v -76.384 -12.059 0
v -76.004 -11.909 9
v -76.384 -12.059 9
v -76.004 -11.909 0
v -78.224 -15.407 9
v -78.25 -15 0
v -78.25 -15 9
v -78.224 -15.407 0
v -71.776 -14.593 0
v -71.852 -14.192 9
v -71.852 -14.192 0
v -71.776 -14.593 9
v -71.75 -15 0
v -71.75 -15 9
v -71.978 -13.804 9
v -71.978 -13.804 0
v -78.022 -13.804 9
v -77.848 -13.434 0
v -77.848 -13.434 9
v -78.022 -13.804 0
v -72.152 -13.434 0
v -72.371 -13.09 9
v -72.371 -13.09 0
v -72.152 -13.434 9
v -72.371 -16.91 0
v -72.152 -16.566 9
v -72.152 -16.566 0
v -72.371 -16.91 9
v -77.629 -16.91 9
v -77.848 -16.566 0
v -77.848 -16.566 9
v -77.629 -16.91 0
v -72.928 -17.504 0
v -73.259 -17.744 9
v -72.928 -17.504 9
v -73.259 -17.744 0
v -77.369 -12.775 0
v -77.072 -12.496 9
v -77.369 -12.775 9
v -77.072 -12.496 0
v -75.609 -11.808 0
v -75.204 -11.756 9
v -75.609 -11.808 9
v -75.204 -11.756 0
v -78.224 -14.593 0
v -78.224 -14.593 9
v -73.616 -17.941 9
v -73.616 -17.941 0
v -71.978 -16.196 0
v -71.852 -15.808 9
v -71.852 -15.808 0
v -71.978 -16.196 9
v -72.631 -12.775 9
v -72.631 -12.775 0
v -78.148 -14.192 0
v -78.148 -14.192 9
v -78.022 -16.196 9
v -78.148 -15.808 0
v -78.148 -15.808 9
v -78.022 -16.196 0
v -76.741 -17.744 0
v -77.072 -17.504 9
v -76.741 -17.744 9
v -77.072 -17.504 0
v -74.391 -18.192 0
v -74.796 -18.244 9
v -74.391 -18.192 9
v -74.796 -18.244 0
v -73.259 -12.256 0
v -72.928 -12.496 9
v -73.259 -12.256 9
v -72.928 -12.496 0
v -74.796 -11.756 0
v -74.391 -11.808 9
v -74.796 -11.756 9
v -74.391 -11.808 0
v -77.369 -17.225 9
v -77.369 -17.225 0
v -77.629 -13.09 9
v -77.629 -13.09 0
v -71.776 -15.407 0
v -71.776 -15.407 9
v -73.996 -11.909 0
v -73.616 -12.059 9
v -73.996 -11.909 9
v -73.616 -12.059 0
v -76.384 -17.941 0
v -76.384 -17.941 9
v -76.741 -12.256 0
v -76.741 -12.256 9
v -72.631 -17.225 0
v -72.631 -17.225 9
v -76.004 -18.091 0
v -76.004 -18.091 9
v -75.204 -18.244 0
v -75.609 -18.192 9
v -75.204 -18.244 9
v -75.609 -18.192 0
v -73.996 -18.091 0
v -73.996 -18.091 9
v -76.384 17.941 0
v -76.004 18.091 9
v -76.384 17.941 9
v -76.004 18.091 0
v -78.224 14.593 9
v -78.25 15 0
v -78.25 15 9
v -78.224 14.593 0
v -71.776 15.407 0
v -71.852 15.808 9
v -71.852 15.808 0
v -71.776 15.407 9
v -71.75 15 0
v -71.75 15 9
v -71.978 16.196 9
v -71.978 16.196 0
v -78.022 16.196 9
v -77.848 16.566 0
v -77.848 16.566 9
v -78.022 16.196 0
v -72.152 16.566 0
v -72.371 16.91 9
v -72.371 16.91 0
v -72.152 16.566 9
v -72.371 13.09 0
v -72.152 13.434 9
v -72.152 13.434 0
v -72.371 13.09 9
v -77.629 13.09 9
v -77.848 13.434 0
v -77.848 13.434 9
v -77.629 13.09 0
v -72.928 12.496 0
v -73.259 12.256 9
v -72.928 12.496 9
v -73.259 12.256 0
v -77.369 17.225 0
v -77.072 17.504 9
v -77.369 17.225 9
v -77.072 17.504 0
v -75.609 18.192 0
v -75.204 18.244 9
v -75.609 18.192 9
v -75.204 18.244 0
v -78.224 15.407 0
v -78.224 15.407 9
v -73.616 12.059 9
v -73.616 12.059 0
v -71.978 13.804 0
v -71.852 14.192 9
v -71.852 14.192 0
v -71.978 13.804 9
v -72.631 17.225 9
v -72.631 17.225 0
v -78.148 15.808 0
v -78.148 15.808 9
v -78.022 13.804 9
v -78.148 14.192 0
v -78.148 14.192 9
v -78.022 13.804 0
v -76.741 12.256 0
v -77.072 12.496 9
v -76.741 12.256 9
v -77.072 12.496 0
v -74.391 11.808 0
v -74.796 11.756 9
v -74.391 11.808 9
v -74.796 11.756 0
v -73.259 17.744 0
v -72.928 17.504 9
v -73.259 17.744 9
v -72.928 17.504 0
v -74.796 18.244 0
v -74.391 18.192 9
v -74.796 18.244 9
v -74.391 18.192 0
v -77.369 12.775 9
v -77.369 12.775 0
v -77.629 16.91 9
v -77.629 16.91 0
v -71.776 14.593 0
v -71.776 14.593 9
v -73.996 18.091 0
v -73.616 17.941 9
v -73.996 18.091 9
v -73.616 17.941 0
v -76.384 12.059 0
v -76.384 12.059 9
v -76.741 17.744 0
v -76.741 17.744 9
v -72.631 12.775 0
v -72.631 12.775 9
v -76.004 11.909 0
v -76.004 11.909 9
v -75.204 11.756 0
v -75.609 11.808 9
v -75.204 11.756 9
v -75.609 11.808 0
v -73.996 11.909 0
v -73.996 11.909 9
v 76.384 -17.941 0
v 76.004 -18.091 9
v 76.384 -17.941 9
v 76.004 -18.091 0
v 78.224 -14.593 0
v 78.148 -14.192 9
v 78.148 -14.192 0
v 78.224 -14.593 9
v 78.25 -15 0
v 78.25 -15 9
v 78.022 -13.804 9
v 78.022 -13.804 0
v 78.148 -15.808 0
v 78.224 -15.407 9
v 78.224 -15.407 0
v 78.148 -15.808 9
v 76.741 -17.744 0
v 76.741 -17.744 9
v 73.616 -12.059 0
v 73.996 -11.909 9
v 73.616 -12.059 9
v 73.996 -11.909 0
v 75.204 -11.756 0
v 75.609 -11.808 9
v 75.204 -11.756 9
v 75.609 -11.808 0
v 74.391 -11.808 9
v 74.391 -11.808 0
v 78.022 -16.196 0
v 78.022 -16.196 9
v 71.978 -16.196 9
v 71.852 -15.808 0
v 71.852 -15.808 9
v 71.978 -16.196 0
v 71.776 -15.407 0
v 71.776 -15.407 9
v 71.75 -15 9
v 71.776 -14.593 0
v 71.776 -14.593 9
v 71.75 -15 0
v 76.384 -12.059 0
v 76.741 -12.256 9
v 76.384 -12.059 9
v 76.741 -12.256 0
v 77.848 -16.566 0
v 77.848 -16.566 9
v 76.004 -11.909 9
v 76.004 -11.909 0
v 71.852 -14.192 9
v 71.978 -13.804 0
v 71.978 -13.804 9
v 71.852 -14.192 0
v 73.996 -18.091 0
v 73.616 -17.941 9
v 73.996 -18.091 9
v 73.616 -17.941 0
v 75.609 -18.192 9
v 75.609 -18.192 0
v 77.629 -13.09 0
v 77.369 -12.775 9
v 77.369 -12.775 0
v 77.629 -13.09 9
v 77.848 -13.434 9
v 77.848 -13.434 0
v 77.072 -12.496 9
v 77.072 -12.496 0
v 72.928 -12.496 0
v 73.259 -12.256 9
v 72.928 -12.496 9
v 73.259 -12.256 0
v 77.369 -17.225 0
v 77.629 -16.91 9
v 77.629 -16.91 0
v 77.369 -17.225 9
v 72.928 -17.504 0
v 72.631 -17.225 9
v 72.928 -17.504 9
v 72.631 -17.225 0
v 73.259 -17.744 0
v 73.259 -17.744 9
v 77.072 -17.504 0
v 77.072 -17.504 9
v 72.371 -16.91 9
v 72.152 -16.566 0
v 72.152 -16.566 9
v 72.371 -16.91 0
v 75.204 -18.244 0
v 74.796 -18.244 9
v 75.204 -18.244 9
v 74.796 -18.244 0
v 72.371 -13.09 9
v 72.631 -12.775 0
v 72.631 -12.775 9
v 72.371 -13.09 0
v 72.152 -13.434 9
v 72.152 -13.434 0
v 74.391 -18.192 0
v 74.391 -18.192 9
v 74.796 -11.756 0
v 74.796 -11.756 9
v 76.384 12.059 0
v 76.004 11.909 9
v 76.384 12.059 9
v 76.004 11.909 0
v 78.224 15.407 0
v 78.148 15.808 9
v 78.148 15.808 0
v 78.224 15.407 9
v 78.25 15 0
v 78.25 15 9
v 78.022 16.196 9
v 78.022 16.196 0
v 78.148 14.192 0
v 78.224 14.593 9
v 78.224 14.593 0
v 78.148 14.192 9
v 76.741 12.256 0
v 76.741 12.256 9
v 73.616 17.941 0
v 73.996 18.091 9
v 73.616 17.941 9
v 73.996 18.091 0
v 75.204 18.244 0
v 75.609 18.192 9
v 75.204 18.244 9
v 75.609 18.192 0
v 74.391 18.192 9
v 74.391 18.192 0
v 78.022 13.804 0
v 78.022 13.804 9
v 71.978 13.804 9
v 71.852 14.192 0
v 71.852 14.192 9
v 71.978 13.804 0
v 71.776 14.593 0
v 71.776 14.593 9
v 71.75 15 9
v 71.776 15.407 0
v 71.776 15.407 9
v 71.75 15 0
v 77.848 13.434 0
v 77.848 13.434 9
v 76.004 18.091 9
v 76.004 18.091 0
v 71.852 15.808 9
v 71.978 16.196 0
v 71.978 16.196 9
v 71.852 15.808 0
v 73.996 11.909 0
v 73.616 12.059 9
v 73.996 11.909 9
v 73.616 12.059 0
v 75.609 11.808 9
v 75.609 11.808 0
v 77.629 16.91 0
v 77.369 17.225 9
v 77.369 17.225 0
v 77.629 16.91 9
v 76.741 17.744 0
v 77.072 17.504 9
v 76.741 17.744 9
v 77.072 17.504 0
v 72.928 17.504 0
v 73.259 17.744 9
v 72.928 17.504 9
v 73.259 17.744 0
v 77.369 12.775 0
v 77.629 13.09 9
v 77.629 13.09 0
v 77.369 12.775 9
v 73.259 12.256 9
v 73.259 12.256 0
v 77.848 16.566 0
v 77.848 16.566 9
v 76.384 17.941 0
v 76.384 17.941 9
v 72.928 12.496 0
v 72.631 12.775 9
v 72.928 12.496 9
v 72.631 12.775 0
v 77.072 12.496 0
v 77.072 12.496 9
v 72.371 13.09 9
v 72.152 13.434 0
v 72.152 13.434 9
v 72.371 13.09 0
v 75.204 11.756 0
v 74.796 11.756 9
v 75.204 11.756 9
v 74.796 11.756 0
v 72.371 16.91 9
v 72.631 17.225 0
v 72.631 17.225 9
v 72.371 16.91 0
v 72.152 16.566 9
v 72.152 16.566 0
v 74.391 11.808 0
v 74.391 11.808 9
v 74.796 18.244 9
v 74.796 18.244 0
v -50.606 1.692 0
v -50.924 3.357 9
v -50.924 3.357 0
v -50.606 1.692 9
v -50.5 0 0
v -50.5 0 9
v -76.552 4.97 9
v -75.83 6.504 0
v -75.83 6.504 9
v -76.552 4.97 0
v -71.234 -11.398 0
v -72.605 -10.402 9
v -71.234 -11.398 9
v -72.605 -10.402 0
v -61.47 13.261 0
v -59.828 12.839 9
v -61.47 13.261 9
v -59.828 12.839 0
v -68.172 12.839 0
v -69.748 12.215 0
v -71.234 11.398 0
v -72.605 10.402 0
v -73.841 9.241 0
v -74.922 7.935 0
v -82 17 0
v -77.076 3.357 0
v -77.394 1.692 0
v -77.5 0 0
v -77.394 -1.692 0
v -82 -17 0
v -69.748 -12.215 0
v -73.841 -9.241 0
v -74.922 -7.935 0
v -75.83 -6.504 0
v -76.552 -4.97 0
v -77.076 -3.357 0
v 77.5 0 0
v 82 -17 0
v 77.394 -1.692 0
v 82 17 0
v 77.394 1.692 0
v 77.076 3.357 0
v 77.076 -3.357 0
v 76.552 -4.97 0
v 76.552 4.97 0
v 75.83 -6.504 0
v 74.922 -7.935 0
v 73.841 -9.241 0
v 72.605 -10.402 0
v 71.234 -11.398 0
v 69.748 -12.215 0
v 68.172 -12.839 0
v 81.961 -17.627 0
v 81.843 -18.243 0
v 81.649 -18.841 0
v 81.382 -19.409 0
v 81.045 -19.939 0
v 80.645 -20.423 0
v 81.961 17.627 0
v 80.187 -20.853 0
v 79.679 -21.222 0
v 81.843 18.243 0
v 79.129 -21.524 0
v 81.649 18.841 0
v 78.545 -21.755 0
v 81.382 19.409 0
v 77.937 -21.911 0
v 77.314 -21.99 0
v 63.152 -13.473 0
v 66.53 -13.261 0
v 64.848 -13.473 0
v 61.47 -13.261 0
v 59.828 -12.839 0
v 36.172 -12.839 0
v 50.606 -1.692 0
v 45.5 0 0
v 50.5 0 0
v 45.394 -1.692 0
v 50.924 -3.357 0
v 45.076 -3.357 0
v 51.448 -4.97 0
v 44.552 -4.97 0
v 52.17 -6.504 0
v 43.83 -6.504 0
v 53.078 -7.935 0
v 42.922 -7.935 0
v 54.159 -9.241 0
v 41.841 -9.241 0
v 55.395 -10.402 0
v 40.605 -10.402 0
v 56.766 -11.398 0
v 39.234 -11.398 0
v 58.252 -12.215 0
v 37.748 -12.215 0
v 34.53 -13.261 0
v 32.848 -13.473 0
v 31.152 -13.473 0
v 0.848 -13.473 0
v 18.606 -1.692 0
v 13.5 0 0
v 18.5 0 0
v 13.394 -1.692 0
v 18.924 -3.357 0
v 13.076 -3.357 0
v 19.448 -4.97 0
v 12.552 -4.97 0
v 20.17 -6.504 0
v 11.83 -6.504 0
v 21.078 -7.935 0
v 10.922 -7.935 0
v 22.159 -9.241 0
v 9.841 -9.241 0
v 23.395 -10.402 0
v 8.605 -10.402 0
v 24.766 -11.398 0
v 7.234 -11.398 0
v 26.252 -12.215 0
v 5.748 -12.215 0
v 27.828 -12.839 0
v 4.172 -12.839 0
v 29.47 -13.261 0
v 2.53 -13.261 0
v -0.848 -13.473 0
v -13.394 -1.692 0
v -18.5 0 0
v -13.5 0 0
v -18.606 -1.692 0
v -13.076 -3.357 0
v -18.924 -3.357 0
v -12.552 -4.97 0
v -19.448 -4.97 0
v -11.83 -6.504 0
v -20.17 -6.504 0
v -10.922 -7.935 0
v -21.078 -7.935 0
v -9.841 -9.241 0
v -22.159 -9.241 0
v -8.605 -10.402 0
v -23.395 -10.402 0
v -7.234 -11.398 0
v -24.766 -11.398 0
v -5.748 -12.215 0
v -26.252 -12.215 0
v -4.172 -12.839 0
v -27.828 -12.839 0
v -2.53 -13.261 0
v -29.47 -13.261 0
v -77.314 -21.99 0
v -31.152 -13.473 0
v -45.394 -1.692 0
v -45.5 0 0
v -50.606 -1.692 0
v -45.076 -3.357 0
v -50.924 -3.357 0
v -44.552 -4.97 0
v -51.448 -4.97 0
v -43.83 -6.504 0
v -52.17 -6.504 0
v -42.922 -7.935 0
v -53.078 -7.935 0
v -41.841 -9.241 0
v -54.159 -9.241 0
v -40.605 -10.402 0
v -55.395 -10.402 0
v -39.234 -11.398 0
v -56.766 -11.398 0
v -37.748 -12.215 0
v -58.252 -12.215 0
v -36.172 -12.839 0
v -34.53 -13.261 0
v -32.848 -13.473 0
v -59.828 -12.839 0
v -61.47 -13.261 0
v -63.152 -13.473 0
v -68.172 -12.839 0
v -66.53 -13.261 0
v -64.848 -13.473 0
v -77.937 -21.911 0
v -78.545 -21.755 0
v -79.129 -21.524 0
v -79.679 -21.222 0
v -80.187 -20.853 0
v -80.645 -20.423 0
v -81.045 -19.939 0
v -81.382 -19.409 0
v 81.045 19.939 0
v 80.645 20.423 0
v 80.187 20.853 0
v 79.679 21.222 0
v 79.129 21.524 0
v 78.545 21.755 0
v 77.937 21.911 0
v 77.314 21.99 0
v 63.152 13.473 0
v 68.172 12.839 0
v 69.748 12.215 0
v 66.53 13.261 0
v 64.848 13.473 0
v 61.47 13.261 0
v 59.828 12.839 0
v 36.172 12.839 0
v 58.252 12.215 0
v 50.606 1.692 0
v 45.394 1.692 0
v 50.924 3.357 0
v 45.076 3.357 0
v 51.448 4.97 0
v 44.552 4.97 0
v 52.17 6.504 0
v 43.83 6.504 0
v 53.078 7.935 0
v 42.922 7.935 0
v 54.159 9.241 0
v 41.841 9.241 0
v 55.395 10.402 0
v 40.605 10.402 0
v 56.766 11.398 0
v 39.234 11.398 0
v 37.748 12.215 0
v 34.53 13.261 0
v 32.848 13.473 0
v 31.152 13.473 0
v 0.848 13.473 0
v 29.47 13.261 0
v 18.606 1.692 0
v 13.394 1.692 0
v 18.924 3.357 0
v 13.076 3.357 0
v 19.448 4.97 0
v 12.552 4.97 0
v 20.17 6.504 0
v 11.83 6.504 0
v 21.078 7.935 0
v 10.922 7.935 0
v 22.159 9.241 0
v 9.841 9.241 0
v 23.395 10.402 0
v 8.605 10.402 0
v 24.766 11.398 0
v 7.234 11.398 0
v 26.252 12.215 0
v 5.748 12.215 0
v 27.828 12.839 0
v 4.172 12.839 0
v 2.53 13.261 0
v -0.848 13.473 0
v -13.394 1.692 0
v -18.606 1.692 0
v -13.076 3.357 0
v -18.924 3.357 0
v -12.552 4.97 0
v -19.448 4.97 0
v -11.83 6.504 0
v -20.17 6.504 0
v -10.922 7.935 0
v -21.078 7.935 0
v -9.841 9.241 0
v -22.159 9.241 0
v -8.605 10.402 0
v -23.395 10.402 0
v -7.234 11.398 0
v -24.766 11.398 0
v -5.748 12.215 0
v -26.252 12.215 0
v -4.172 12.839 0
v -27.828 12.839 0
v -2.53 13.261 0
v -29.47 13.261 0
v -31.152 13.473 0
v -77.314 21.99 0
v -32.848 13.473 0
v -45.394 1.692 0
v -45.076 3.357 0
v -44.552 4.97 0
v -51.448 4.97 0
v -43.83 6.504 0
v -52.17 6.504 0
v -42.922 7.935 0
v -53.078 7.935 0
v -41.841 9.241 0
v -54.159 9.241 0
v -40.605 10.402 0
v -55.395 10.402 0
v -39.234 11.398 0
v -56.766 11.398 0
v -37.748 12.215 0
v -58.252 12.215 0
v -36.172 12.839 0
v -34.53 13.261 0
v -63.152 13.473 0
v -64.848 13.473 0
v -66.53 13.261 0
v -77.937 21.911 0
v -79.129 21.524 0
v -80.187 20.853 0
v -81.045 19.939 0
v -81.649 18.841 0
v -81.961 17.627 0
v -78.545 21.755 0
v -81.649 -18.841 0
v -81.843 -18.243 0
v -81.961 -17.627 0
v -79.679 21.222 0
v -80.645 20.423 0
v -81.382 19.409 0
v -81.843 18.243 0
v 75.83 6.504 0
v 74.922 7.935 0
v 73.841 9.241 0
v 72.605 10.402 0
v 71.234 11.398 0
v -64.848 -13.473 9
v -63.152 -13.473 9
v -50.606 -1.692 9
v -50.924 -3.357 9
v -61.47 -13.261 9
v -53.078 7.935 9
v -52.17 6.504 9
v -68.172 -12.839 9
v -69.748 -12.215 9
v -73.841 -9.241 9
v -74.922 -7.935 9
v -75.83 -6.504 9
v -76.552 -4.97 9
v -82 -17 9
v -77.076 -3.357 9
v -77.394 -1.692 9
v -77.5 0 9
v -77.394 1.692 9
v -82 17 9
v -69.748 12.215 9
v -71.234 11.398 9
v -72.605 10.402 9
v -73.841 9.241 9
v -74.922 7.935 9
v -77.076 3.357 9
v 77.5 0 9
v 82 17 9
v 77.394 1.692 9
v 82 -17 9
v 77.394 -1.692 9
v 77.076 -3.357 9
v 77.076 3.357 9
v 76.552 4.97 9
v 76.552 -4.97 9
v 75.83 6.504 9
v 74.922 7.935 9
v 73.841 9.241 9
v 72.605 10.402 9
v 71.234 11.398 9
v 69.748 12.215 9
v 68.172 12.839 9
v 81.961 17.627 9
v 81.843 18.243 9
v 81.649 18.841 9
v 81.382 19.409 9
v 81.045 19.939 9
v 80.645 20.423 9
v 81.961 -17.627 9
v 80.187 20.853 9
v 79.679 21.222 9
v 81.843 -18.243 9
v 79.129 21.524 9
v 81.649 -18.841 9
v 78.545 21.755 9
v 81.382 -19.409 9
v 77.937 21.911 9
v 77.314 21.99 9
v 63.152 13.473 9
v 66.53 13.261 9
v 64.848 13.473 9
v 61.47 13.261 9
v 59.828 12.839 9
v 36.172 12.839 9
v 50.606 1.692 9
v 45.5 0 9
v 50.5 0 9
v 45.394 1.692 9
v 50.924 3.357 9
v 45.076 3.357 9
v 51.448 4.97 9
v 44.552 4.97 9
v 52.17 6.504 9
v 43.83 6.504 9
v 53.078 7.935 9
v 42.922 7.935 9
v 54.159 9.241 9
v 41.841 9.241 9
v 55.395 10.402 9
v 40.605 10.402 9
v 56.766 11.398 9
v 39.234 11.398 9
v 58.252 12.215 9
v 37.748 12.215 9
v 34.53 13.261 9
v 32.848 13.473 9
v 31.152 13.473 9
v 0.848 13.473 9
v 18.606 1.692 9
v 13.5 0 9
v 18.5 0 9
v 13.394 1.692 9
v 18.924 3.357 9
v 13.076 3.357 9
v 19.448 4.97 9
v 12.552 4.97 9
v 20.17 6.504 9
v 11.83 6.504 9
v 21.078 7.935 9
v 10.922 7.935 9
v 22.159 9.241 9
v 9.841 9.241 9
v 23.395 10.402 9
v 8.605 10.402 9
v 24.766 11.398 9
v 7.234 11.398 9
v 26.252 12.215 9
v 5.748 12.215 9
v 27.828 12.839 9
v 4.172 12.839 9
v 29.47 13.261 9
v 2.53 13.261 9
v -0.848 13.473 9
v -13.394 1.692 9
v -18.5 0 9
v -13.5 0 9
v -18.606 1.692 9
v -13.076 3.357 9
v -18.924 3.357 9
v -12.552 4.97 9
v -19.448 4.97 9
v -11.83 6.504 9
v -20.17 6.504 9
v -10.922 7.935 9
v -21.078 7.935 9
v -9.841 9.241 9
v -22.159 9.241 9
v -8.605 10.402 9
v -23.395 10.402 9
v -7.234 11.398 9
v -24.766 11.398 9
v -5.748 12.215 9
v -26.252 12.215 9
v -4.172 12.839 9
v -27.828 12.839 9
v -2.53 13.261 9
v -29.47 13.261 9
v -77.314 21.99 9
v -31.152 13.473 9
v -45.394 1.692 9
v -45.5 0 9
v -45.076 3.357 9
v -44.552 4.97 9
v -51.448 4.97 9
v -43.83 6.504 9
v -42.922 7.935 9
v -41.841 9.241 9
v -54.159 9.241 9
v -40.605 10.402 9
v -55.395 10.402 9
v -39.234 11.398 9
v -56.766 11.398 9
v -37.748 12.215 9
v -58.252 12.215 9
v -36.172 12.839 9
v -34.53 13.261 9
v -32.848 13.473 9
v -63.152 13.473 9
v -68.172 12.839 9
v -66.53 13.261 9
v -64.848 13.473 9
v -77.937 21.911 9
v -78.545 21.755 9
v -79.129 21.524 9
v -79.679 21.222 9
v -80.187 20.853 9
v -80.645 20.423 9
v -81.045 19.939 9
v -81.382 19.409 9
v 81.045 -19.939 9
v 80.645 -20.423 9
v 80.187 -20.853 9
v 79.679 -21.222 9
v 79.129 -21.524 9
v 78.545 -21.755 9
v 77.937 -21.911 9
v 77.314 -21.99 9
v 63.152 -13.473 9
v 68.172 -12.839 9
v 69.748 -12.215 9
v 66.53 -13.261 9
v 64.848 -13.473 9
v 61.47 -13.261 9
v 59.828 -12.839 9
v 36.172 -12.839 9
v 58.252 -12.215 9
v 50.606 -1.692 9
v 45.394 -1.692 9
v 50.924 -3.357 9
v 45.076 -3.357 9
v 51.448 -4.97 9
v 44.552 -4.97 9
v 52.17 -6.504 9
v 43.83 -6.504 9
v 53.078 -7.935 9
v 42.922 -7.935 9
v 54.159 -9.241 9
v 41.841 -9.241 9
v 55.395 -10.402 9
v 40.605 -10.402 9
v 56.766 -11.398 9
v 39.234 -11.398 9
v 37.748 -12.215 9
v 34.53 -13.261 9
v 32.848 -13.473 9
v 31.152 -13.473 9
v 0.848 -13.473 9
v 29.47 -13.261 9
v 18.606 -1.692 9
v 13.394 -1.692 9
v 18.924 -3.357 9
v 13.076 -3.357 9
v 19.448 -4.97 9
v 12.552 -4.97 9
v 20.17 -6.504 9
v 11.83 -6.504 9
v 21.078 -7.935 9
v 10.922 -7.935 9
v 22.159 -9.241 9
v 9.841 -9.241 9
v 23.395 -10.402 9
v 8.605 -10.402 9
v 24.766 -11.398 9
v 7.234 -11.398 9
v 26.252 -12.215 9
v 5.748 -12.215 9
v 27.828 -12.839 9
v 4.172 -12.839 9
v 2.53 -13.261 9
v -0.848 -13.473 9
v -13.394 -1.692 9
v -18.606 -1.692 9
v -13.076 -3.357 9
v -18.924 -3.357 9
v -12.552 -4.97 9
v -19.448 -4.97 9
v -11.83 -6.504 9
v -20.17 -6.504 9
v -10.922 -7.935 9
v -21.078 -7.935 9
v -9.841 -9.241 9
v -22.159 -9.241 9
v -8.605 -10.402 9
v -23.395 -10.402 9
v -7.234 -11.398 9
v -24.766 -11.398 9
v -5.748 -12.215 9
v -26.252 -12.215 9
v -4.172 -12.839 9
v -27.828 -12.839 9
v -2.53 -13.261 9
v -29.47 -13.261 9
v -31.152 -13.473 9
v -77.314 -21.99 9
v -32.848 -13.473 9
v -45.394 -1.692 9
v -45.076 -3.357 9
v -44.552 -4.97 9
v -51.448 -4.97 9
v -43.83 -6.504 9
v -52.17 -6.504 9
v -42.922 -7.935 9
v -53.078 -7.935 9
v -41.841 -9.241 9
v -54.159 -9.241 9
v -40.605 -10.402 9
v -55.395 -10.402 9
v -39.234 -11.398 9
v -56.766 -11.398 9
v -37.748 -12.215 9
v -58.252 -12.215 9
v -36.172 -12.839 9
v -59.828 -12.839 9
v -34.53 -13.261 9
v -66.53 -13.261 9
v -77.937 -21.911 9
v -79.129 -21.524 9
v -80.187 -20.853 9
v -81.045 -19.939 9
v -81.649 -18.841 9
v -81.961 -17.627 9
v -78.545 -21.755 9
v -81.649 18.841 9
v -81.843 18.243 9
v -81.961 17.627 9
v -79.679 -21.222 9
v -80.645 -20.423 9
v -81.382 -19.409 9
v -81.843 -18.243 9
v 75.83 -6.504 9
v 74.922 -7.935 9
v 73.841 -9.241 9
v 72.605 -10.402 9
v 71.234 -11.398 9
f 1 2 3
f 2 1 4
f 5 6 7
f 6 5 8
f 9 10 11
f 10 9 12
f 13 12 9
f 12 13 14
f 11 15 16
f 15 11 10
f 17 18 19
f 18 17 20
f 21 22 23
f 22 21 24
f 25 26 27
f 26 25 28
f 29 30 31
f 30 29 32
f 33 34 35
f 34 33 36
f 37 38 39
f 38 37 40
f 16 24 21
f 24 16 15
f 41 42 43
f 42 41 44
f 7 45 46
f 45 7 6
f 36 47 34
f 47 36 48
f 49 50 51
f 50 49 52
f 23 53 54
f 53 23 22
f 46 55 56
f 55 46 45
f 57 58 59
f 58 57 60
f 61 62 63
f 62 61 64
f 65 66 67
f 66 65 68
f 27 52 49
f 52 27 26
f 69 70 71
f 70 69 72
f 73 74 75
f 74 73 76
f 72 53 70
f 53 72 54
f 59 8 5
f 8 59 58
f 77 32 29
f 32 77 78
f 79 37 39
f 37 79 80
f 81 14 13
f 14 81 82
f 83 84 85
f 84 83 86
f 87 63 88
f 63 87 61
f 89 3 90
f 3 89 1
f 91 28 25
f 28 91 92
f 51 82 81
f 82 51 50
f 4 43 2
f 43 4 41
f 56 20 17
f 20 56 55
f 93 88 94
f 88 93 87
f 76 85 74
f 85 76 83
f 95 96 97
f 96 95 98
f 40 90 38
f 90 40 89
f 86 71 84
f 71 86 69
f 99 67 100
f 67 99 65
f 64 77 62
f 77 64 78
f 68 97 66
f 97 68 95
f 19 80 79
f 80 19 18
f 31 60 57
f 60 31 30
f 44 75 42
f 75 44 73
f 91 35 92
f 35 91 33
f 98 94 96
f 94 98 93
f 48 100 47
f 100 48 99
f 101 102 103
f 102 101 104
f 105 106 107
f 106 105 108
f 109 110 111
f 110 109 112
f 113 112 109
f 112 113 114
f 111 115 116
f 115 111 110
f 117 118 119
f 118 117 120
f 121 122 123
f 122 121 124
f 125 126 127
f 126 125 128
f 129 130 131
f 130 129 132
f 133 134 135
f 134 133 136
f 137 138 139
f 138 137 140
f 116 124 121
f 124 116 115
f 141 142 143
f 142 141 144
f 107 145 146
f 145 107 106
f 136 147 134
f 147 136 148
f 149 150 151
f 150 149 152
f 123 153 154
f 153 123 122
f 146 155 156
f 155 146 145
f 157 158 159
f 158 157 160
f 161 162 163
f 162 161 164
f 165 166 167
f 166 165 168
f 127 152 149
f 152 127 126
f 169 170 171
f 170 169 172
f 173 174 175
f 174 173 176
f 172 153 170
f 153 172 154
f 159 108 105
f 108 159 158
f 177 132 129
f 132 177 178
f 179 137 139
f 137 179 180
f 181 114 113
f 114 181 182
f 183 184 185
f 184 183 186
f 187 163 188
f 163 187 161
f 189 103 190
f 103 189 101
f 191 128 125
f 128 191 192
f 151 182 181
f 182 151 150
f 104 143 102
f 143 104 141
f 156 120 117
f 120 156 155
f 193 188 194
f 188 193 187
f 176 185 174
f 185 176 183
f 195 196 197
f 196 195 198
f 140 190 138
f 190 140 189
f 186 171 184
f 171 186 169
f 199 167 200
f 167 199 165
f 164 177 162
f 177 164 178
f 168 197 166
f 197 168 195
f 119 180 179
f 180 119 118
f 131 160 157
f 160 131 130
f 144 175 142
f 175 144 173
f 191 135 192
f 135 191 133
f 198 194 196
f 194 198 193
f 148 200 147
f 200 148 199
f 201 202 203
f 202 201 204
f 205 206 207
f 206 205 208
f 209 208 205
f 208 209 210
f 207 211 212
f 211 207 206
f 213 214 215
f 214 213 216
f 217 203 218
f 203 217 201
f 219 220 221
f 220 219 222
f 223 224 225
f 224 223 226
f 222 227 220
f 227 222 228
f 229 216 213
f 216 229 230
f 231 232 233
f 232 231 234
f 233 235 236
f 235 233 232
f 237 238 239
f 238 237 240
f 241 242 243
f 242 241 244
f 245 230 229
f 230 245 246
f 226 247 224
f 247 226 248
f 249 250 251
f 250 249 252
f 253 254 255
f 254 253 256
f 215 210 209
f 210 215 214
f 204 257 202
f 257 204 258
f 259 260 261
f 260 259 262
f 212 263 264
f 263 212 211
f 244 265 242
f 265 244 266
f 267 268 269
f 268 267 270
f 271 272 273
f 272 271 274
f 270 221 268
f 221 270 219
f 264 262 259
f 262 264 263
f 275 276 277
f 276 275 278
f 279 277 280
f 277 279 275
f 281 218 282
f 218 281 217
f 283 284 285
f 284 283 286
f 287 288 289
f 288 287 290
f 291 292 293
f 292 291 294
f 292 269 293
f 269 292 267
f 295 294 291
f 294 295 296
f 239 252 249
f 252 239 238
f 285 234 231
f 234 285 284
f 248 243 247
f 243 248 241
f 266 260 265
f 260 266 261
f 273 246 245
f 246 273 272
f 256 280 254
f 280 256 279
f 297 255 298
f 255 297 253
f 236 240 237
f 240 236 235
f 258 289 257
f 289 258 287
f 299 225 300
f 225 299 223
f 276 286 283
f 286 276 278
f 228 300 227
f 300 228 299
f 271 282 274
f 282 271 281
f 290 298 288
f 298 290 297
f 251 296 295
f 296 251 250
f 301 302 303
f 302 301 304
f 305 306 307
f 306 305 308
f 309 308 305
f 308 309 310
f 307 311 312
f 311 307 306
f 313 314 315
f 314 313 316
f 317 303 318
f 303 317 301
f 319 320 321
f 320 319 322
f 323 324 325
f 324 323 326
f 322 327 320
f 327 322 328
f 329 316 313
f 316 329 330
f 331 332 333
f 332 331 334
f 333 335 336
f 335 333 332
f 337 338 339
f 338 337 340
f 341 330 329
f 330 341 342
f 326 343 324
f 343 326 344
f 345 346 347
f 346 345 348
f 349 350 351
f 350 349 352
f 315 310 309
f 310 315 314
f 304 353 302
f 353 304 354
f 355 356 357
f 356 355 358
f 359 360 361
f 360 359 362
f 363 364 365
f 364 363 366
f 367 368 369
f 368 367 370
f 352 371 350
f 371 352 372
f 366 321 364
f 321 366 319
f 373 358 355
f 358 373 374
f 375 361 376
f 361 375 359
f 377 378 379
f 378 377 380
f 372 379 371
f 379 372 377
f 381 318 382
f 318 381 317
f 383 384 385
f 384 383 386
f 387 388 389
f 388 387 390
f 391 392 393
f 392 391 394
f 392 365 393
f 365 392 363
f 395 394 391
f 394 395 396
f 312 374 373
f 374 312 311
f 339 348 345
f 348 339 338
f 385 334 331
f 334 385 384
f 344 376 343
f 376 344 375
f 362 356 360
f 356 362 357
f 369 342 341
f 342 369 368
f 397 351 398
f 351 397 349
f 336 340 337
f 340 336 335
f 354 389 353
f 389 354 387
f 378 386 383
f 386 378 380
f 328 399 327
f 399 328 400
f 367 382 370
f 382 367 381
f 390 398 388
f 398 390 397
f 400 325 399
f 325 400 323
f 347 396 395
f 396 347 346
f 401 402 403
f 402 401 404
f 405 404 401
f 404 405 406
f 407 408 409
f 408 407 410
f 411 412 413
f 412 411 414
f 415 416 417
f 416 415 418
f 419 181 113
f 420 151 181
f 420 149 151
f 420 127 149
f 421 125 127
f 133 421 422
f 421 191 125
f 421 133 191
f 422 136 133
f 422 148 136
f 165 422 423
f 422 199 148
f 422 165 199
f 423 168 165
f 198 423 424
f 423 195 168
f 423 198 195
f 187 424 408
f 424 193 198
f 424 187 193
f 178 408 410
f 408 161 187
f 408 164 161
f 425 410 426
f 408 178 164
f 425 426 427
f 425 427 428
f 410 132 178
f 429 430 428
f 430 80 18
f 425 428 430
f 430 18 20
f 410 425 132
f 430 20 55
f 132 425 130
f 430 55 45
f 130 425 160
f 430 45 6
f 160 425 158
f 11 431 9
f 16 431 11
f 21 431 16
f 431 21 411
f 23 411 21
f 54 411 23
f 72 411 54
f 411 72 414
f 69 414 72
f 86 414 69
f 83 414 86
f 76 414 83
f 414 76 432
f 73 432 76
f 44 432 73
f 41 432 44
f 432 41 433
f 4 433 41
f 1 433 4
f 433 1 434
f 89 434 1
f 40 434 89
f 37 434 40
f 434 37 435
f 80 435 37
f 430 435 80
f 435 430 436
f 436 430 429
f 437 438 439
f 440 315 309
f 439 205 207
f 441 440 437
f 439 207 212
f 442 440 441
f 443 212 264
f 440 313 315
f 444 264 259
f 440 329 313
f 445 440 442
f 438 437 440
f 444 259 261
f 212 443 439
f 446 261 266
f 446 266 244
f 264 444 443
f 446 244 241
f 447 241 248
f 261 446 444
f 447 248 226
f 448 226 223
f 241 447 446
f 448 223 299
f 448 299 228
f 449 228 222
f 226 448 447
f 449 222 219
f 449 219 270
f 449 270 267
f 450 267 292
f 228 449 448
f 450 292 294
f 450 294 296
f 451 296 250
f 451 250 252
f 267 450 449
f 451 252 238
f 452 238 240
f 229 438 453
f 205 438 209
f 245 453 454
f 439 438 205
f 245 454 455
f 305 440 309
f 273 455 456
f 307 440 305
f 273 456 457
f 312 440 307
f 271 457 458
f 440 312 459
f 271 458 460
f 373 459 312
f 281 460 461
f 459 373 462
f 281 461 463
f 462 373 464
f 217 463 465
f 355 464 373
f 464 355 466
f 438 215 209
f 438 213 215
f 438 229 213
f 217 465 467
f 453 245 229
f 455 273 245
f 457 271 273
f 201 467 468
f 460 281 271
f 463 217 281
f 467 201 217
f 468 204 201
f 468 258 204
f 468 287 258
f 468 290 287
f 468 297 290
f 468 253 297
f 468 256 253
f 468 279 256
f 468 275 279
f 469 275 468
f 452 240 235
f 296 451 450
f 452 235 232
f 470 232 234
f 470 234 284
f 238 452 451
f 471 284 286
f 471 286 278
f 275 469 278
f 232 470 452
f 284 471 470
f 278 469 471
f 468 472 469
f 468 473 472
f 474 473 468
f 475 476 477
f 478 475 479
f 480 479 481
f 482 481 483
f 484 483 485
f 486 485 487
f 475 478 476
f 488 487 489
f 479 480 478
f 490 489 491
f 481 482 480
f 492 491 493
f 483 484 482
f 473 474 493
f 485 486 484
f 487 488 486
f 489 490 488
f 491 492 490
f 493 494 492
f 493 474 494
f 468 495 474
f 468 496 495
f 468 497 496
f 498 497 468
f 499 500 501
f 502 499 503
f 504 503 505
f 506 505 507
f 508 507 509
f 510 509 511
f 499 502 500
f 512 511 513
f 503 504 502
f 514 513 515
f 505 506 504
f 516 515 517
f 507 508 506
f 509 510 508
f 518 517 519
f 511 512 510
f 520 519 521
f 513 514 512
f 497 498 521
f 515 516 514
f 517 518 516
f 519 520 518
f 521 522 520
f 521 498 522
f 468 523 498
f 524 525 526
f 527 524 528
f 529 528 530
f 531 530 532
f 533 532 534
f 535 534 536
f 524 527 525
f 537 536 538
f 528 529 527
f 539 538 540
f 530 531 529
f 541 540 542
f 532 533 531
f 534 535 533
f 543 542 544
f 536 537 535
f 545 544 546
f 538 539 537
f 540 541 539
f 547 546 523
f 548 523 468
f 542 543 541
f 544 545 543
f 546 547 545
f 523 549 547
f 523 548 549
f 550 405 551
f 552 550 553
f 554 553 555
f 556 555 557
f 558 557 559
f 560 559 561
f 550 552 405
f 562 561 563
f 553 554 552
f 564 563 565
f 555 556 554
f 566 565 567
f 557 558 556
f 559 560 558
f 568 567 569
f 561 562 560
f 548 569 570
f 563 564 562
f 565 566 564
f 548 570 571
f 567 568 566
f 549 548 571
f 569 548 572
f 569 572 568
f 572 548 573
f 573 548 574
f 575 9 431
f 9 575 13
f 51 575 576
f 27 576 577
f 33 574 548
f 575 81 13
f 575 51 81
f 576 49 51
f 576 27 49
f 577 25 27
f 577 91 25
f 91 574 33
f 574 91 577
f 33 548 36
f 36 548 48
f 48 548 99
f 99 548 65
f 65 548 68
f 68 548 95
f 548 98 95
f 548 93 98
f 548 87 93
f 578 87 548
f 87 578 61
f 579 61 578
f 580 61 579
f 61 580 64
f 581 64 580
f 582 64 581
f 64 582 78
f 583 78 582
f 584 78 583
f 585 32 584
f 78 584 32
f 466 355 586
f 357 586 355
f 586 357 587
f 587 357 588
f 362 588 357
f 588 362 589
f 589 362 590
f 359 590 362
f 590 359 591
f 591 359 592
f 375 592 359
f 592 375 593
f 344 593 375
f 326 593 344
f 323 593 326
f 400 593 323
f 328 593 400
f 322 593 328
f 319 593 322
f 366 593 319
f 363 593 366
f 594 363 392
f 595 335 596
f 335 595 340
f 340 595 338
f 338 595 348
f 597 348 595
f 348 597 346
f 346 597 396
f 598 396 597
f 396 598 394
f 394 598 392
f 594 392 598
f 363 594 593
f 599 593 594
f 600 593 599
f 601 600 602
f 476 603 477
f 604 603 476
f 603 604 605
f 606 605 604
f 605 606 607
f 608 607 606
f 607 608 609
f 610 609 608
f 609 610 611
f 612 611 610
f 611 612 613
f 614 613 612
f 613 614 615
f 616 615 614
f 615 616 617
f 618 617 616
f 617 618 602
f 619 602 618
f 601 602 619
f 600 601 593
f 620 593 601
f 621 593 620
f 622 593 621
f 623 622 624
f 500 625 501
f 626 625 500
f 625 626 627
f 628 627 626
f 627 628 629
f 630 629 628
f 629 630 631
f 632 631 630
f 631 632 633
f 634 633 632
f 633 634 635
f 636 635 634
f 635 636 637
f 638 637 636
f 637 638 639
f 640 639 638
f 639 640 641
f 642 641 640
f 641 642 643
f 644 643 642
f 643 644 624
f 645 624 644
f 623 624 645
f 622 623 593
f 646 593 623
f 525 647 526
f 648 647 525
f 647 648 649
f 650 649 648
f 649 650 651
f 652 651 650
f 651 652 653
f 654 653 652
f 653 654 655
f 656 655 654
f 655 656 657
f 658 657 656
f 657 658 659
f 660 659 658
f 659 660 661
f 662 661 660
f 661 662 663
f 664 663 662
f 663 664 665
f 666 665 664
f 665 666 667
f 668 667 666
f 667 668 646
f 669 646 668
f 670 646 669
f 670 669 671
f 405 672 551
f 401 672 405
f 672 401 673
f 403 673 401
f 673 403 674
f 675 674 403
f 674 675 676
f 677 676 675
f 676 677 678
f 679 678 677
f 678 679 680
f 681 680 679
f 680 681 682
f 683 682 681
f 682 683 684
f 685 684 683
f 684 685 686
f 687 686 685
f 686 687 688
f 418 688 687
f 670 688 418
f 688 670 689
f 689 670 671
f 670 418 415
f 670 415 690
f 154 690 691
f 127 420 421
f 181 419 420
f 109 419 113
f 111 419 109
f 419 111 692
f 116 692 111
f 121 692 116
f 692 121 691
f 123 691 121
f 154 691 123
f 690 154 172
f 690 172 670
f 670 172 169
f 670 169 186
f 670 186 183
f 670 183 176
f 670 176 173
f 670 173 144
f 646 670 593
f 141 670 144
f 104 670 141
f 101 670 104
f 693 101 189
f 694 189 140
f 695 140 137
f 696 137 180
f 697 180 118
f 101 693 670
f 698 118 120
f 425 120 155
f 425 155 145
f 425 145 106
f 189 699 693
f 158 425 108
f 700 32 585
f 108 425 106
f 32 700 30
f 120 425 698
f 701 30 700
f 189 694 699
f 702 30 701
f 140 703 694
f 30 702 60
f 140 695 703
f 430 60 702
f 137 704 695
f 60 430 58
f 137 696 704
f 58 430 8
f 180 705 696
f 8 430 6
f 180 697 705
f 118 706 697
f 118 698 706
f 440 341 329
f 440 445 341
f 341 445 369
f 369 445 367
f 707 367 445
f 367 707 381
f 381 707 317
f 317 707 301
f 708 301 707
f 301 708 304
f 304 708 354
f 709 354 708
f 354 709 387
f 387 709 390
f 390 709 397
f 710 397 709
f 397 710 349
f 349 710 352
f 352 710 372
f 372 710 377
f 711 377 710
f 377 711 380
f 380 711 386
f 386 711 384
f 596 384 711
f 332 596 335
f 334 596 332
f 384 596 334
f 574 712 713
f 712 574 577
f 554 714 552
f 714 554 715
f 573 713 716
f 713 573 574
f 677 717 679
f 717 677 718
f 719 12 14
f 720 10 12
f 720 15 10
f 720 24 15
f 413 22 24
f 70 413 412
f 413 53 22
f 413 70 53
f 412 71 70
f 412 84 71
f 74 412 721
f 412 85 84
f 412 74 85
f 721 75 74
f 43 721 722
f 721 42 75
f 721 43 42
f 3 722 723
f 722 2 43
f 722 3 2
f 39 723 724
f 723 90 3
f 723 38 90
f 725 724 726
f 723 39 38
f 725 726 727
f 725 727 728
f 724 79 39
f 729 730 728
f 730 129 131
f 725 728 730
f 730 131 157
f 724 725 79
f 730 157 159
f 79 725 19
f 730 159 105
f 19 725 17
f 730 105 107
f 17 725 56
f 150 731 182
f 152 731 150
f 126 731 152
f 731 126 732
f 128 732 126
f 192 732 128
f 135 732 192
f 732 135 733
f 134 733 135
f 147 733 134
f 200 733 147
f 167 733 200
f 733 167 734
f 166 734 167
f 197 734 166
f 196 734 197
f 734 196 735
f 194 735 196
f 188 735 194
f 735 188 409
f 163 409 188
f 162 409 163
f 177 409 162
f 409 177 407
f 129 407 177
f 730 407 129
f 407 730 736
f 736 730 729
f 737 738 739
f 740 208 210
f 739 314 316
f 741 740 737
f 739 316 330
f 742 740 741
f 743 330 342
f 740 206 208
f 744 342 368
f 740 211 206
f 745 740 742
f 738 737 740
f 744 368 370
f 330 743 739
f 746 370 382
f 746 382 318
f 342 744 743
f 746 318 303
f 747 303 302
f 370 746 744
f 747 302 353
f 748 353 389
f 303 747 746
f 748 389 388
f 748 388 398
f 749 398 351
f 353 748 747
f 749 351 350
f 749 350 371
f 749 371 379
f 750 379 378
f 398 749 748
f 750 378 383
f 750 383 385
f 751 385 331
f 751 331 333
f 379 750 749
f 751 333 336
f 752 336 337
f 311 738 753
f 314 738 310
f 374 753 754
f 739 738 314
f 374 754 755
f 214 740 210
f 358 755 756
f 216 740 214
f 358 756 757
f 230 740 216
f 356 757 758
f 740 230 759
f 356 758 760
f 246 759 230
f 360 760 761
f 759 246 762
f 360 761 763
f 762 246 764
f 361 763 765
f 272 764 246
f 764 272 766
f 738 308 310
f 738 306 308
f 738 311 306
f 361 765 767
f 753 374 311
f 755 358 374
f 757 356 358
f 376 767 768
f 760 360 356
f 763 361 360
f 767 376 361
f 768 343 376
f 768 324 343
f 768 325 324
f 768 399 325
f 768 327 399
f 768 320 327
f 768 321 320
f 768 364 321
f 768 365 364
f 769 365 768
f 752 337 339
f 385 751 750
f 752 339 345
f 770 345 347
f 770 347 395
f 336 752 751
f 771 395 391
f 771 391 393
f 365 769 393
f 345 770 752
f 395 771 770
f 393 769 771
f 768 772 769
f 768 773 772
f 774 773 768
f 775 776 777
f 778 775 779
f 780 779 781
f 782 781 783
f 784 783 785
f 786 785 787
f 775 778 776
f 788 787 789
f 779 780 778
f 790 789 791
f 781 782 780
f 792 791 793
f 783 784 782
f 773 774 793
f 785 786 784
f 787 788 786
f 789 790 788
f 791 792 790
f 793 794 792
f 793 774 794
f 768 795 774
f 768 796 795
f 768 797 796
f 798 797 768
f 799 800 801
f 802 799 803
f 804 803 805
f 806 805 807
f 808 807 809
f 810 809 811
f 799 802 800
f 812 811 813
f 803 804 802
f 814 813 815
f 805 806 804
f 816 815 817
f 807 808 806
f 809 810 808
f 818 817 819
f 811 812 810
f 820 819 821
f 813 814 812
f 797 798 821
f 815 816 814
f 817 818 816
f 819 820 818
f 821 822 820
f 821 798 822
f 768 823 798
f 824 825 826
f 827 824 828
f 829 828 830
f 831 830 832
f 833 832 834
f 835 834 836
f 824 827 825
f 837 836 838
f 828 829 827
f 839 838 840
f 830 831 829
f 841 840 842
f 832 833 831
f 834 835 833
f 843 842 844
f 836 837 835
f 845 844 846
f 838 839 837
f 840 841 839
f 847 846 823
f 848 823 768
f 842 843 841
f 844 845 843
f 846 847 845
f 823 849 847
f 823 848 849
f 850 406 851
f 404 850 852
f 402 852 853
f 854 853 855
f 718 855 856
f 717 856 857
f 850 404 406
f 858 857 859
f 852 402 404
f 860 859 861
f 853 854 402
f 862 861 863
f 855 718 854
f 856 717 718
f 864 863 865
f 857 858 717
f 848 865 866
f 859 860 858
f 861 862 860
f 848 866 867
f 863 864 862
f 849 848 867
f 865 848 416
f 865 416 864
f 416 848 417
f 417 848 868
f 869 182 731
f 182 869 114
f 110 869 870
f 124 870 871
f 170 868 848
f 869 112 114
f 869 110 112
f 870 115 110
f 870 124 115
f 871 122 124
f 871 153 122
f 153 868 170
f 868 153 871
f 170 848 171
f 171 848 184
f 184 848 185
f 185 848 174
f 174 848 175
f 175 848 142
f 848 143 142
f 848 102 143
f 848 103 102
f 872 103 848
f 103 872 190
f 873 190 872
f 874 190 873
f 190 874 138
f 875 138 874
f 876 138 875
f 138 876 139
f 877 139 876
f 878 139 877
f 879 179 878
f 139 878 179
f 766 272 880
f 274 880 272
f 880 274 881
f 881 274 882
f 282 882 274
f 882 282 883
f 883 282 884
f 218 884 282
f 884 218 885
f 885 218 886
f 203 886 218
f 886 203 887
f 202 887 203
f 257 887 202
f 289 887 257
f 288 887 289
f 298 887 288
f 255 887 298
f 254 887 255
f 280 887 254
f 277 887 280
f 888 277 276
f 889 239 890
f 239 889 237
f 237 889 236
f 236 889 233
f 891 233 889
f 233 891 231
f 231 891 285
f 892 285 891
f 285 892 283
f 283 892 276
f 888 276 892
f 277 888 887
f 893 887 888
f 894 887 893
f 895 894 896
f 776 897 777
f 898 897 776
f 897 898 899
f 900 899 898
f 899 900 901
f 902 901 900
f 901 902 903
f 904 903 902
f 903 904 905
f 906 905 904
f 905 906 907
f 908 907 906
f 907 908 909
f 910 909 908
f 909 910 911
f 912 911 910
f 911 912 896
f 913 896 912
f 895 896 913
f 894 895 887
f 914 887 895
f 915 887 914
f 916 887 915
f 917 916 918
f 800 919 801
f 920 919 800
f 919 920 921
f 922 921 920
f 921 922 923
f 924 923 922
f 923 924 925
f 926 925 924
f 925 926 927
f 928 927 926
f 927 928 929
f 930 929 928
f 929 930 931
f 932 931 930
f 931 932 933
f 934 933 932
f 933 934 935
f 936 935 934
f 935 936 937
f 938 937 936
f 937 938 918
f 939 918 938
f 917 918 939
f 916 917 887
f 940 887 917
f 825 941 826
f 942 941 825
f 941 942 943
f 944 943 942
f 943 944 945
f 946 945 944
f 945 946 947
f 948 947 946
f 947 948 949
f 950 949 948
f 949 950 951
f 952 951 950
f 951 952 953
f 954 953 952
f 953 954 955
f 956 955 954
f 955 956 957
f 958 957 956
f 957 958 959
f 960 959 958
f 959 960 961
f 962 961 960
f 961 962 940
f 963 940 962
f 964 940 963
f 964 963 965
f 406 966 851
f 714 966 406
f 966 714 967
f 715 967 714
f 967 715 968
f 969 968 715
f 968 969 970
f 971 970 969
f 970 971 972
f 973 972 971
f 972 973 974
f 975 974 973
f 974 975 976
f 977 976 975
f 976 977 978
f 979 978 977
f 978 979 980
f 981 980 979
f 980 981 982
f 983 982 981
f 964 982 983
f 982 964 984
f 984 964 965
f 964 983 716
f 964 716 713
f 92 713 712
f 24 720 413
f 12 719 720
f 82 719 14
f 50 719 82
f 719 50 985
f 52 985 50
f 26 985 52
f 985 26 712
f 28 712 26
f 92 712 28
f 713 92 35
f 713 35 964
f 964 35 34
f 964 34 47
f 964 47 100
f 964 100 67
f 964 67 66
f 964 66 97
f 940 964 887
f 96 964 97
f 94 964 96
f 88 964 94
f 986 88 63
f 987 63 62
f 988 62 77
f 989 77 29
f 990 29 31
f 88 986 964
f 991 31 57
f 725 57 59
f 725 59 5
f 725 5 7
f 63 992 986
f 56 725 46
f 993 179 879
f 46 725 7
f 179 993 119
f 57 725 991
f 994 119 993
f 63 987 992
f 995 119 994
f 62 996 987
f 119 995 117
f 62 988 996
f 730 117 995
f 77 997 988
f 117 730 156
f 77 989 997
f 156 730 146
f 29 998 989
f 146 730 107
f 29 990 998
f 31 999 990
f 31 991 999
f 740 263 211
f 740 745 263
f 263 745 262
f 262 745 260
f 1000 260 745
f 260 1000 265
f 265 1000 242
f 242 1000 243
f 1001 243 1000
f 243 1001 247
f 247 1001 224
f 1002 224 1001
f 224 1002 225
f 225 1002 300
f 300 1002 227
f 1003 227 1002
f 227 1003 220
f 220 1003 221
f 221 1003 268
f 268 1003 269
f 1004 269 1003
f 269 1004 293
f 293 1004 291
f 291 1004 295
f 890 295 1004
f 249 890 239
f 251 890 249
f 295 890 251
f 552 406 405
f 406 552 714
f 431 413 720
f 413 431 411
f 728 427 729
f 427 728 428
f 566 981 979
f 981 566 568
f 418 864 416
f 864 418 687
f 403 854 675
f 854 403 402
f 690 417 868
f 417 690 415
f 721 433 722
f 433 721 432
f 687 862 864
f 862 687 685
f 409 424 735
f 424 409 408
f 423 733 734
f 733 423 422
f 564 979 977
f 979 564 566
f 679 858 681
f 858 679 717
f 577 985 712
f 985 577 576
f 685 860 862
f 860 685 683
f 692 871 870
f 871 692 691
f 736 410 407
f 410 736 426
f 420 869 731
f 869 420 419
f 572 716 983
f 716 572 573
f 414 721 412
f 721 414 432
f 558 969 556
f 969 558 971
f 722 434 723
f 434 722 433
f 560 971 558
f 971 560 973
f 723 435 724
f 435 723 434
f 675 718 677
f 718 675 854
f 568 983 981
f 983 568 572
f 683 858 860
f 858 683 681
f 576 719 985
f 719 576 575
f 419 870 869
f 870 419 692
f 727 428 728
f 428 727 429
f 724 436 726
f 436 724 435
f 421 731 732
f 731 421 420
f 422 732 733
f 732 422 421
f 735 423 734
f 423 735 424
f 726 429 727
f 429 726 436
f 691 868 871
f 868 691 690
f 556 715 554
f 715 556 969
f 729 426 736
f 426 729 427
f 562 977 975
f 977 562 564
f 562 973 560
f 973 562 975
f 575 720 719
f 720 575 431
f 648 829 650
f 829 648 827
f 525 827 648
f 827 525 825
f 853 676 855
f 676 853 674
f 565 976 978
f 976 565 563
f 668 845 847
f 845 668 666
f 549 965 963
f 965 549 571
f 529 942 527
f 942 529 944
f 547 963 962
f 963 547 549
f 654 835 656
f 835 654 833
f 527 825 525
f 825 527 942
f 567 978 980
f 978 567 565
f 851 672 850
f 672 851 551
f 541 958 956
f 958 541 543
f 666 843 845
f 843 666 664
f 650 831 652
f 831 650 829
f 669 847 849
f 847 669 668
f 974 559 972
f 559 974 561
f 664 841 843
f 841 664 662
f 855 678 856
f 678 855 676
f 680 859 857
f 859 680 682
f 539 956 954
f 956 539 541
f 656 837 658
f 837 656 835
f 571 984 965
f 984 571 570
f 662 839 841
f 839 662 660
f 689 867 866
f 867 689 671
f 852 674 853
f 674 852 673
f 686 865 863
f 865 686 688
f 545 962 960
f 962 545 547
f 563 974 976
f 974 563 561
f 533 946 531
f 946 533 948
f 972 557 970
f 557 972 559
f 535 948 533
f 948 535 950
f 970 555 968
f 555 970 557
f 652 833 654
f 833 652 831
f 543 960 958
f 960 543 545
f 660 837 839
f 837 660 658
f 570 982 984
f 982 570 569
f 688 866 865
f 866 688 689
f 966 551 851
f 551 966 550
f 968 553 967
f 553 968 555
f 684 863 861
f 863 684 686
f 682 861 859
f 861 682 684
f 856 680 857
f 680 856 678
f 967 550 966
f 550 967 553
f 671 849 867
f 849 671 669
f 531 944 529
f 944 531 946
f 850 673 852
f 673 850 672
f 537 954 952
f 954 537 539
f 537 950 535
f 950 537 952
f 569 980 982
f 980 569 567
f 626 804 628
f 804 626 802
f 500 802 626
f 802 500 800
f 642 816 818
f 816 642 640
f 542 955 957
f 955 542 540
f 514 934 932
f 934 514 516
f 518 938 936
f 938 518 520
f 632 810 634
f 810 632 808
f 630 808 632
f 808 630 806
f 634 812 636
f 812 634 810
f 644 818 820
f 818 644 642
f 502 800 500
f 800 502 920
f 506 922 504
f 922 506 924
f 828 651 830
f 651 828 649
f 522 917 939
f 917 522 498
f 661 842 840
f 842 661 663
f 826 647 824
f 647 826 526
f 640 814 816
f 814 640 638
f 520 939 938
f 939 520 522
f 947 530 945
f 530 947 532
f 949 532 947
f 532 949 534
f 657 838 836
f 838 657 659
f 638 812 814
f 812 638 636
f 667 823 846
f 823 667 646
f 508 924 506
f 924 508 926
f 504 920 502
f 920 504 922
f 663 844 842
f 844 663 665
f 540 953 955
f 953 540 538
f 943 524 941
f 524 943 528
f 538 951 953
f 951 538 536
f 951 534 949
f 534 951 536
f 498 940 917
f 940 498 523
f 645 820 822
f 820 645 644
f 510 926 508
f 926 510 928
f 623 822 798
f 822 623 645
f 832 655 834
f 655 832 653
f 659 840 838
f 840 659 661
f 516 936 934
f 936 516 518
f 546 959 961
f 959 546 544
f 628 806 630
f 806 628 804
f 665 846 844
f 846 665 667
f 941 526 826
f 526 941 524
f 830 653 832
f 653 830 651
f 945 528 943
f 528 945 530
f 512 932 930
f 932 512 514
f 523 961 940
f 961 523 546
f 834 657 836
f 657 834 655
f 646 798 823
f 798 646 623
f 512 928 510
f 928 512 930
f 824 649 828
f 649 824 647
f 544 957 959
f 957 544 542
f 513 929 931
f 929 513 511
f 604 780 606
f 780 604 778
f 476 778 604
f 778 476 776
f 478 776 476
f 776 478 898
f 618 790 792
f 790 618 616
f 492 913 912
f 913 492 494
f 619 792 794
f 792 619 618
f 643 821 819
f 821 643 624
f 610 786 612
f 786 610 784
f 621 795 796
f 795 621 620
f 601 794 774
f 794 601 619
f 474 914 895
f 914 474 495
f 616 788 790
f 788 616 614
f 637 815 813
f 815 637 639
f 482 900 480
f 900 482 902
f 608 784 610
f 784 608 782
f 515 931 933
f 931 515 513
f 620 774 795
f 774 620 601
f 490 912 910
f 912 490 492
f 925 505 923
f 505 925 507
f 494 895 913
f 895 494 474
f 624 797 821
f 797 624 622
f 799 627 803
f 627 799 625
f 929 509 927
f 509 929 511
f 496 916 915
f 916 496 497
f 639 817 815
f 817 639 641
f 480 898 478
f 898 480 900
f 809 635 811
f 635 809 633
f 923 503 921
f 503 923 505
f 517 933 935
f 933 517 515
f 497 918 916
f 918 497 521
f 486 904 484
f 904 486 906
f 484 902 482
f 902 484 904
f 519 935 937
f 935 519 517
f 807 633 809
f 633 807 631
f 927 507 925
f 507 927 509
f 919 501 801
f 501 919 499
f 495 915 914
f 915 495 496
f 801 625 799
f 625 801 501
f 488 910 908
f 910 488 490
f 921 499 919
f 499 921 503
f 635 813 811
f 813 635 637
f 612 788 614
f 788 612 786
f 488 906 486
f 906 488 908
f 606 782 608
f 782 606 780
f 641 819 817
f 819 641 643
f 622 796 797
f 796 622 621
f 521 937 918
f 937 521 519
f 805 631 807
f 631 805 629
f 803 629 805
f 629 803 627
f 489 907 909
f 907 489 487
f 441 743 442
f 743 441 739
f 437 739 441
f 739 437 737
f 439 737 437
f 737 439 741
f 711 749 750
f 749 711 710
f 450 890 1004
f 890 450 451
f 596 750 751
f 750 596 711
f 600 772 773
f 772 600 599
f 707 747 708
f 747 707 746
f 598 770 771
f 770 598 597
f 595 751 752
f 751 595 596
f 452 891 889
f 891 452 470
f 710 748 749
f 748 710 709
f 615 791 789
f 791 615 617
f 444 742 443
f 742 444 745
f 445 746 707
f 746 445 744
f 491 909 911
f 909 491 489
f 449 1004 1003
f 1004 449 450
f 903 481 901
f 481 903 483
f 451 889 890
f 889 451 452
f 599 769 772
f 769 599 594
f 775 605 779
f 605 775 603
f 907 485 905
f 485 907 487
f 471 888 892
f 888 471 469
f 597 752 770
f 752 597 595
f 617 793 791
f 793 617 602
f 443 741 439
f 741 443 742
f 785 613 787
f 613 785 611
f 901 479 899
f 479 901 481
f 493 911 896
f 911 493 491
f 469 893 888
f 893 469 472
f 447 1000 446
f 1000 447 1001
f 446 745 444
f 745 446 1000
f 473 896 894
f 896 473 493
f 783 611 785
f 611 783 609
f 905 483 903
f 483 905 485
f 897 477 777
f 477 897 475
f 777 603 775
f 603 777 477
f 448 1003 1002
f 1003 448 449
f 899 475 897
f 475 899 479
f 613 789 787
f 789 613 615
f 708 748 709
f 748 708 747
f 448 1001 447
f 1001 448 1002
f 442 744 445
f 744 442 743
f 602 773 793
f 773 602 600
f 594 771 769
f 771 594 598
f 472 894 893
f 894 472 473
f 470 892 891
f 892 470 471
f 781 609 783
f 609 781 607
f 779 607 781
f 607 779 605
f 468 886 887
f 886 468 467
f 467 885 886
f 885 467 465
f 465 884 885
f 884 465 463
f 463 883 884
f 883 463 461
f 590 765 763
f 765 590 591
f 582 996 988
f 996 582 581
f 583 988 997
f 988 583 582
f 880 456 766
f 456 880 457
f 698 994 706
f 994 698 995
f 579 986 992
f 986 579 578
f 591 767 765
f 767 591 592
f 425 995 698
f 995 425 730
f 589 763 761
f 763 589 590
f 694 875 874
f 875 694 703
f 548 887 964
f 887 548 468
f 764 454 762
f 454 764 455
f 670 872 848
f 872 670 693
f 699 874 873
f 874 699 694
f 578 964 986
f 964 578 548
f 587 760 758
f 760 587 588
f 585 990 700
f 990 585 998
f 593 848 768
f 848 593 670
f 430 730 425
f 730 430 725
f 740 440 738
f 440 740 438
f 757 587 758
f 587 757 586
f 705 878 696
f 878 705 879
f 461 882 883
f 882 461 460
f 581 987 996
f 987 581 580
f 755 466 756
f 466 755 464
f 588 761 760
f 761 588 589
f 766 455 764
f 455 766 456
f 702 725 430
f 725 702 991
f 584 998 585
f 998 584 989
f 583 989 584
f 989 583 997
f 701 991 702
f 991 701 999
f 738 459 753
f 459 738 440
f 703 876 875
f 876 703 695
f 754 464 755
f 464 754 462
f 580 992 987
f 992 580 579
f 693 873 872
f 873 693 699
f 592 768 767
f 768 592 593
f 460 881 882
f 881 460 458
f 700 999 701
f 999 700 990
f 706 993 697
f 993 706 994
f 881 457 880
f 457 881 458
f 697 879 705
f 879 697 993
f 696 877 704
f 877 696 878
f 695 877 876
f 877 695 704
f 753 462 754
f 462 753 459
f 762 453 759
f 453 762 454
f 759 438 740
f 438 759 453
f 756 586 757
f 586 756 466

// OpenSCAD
$fn = 50;

difference() {
	union() {
		hull() {
			translate(v = [-77.0, 17.0, 0]) {
				cylinder(h = 9, r = 5);
			}
			translate(v = [77.0, 17.0, 0]) {
				cylinder(h = 9, r = 5);
			}
			translate(v = [-77.0, -17.0, 0]) {
				cylinder(h = 9, r = 5);
			}
			translate(v = [77.0, -17.0, 0]) {
				cylinder(h = 9, r = 5);
			}
		}
	}
	union() {
		translate(v = [-75.0, -15.0, -100.0]) {
			cylinder(h = 200, r = 3.25);
		}
		translate(v = [-75.0, 15.0, -100.0]) {
			cylinder(h = 200, r = 3.25);
		}
		translate(v = [75.0, -15.0, -100.0]) {
			cylinder(h = 200, r = 3.25);
		}
		translate(v = [75.0, 15.0, -100.0]) {
			cylinder(h = 200, r = 3.25);
		}
		translate(v = [-75.0, -15.0, -100.0]) {
			cylinder(h = 200, r = 1.8);
		}
		translate(v = [-75.0, 15.0, -100.0]) {
			cylinder(h = 200, r = 1.8);
		}
		translate(v = [75.0, -15.0, -100.0]) {
			cylinder(h = 200, r = 1.8);
		}
		translate(v = [75.0, 15.0, -100.0]) {
			cylinder(h = 200, r = 1.8);
		}
		translate(v = [-64.0, 0, 0.0]) {
			cylinder(h = 9, r = 13.5);
		}
		translate(v = [-32.0, 0, 0.0]) {
			cylinder(h = 9, r = 13.5);
		}
		cylinder(h = 9, r = 13.5);
		translate(v = [32.0, 0, 0.0]) {
			cylinder(h = 9, r = 13.5);
		}
		translate(v = [64.0, 0, 0.0]) {
			cylinder(h = 9, r = 13.5);
		}
	}
}
